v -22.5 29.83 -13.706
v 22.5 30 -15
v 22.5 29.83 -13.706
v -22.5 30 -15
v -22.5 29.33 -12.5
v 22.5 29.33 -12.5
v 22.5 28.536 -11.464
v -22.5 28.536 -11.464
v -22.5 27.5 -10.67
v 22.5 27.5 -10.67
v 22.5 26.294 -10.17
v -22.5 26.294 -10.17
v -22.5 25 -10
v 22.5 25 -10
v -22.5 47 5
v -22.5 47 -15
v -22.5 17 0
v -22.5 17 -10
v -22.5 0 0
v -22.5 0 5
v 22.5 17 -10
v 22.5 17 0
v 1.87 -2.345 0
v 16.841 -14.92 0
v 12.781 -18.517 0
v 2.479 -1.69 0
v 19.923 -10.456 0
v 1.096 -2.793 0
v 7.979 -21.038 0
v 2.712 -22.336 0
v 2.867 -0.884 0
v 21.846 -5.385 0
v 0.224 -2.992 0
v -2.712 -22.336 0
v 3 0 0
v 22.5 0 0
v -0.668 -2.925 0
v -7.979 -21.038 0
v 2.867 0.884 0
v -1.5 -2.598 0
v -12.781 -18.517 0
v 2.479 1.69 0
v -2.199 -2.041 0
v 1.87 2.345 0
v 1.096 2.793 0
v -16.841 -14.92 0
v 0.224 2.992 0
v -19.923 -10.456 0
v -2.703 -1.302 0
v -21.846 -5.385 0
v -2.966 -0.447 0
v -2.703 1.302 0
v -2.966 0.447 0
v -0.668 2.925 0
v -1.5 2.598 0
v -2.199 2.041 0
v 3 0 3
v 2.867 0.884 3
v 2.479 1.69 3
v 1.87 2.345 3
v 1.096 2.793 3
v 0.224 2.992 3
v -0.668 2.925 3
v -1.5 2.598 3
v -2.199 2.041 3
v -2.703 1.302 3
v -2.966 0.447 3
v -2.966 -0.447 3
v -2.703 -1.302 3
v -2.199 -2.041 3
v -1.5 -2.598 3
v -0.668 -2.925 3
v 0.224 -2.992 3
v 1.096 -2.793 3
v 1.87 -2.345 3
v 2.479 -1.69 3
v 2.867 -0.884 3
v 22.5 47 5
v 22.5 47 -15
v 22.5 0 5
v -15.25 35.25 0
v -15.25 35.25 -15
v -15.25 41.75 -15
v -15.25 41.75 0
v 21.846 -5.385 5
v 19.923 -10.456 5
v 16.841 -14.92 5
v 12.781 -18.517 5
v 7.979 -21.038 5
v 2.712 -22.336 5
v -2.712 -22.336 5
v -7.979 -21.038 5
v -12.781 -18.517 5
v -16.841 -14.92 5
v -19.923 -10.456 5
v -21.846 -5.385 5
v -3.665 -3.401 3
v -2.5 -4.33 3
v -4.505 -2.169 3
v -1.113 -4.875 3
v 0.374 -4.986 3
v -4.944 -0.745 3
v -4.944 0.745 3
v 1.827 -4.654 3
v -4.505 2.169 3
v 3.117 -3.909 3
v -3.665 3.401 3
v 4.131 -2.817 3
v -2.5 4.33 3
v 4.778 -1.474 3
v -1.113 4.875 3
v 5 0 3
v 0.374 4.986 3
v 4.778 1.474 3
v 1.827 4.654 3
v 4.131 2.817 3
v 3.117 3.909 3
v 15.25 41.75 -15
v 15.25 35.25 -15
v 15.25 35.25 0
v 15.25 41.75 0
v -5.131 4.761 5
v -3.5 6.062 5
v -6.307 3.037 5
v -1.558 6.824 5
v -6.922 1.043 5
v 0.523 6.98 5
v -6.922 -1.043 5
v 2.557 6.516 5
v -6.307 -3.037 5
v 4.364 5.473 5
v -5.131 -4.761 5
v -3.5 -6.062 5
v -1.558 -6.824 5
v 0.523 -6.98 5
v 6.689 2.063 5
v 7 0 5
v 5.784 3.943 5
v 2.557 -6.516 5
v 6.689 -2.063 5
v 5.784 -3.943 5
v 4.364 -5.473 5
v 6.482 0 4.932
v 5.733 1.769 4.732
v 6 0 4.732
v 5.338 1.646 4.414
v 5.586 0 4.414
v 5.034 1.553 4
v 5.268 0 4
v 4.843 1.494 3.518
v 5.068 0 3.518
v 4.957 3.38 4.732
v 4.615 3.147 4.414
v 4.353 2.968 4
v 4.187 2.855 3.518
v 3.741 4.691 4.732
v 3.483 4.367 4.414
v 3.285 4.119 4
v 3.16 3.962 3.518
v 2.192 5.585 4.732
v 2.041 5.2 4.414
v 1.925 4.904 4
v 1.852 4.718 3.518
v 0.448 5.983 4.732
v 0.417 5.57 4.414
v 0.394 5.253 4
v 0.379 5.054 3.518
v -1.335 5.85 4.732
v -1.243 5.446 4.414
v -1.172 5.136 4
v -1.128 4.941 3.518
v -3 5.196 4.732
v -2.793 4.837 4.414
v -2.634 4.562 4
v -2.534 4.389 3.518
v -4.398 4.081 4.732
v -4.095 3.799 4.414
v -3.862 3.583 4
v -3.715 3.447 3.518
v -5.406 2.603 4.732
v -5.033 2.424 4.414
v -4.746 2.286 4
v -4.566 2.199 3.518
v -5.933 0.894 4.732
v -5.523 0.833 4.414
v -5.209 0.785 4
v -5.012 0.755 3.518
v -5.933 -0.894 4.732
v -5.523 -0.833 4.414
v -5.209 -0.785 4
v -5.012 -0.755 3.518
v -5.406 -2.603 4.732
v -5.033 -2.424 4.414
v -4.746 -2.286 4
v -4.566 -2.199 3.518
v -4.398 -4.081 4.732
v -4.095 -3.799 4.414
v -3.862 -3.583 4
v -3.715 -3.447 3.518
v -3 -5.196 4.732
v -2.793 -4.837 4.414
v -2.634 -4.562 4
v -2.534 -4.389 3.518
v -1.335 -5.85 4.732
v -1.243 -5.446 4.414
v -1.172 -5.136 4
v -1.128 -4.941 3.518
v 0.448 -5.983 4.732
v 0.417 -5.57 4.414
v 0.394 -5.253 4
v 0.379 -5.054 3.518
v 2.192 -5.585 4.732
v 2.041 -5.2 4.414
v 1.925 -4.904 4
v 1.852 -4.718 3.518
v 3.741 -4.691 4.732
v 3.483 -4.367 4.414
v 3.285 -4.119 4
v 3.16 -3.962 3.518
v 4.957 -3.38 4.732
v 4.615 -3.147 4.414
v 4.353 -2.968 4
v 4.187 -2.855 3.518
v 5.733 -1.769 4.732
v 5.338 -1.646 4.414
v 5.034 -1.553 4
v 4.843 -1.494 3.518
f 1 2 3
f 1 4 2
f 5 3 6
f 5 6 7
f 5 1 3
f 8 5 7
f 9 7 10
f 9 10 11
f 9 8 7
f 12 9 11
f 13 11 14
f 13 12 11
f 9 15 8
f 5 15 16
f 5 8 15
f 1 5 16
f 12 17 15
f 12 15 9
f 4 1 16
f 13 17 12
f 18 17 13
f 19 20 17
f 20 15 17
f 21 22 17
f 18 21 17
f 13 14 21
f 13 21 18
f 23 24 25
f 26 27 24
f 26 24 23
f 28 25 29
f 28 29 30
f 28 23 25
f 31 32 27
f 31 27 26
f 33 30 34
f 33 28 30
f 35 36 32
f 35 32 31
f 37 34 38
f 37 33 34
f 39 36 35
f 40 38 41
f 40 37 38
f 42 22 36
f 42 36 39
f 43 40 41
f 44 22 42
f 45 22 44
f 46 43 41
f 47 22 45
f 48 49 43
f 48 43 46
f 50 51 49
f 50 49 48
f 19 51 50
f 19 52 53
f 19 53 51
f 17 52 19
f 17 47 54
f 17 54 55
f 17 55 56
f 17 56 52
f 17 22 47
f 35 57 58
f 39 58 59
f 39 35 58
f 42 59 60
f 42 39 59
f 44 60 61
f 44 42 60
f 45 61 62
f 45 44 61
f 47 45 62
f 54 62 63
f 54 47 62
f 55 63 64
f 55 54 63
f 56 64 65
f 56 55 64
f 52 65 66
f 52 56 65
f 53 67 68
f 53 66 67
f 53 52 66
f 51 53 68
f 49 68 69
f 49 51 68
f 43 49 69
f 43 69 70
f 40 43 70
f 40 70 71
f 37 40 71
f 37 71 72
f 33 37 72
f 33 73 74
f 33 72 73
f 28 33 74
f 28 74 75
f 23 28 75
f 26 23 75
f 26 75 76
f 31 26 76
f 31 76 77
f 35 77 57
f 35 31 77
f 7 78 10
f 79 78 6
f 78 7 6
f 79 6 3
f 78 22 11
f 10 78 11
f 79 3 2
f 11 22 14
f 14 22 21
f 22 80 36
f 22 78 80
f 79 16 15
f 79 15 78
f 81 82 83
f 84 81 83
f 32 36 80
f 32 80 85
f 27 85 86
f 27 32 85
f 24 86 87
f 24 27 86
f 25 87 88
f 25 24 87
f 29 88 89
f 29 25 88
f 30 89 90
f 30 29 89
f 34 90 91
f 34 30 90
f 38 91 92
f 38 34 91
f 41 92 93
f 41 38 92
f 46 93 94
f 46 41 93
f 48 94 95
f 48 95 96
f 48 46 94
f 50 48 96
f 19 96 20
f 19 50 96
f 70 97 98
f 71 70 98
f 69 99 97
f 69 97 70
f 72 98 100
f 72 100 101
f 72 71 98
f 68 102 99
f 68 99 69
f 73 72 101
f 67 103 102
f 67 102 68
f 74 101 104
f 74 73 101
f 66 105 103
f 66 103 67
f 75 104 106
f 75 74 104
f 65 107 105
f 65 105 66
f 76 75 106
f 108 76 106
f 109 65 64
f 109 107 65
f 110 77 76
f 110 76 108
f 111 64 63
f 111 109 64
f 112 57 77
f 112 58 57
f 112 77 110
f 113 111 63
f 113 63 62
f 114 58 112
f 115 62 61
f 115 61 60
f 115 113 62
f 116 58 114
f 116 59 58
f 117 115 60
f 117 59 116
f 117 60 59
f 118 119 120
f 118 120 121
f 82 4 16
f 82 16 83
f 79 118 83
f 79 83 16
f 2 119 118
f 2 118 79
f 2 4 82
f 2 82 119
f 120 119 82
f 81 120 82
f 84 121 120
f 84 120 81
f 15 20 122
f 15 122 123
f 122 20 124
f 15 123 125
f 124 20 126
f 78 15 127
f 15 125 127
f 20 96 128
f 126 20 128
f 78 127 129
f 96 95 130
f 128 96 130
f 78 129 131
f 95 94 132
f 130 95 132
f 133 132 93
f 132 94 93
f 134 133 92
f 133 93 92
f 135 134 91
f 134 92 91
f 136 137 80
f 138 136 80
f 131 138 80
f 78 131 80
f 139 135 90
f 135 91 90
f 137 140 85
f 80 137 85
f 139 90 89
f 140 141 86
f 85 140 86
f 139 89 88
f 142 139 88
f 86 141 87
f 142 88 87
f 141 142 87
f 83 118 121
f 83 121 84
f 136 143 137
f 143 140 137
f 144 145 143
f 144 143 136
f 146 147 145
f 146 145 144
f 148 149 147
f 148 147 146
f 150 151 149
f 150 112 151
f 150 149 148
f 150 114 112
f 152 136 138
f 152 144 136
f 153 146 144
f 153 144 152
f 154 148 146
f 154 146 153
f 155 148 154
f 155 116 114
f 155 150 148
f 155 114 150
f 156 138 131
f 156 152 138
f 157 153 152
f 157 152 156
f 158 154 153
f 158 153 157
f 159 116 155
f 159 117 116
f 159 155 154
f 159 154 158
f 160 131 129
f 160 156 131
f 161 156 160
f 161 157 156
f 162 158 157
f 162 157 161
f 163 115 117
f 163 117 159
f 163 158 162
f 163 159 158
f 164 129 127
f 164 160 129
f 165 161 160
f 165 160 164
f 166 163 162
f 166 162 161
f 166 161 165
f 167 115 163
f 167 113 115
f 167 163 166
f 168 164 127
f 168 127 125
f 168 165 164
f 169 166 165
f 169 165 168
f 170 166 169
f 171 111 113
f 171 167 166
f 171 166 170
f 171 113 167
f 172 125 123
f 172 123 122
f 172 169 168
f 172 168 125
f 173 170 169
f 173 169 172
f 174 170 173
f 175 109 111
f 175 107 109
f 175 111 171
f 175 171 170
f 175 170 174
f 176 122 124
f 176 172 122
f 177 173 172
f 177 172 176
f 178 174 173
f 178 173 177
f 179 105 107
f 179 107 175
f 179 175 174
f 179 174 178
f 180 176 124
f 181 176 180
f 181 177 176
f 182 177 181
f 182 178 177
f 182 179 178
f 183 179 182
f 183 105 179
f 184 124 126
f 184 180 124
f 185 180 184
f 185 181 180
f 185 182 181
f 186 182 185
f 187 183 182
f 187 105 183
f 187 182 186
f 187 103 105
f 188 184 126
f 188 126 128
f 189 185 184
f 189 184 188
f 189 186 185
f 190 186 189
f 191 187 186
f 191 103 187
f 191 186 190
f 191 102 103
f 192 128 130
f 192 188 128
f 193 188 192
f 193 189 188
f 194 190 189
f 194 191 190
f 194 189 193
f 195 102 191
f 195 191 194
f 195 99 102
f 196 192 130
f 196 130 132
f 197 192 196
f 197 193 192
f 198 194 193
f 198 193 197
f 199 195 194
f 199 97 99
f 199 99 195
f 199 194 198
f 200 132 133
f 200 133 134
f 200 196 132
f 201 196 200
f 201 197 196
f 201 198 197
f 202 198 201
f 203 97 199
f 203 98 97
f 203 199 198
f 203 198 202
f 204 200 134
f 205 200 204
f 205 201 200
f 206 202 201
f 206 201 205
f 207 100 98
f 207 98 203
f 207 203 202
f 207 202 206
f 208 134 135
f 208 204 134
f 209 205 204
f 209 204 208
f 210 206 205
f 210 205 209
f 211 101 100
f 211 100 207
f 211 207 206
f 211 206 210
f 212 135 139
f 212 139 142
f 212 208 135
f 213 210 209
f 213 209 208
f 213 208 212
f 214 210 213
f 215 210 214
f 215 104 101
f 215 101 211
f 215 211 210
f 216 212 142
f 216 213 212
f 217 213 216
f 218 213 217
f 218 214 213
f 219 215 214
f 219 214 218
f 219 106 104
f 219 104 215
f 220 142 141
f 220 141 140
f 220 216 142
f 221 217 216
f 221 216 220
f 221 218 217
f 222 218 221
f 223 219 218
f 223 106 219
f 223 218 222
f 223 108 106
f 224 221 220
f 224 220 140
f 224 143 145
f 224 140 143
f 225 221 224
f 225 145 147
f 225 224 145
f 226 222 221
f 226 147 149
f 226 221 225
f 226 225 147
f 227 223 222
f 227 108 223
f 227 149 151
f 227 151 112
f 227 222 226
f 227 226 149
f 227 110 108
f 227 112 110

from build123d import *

# Parameters (mm, degrees)
ESBO_O2_R                = 3
RESSALTO_EXTRUS_O1_DEPTH = 5
ESBO_O7_R                = 5
CORTE_EXTRUS_O2_DEPTH    = 2
ESBO_O3_W                = 45
ESBO_O3_H                = 13
RESSALTO_EXTRUS_O2_DEPTH = 10
ESBO_O4_W                = 45
ESBO_O4_H                = 20
RESSALTO_EXTRUS_O3_DEPTH = 17
ESBO_O6_W                = 30.5
ESBO_O6_H                = 6.5
CORTE_EXTRUS_O1_DEPTH    = 15
FILETE4_R                = 5
FILETE5_R                = 2


with BuildPart() as part:
    # Esboço2 → Ressalto-extrusão1 (new body)
    with BuildSketch(Plane.XY):
        with BuildLine():
            Line((-22.5, 0), (-22.5, 30))
            Line((-22.5, 30), (22.5, 30))
            Line((22.5, 30), (22.5, 0))
            ThreePointArc((22.5, 0), (0, -22.5), (-22.5, 0))
        make_face()
        Circle(ESBO_O2_R, mode=Mode.SUBTRACT)
    extrude(amount=RESSALTO_EXTRUS_O1_DEPTH)

    # Esboço7 → Corte-extrusão2 (cut)
    with BuildSketch(Plane.XY.offset(5)):
        Circle(ESBO_O7_R)
    extrude(amount=-CORTE_EXTRUS_O2_DEPTH, mode=Mode.SUBTRACT)

    # Esboço3 → Ressalto-extrusão2 (add)
    with BuildSketch(Plane(origin=(0, 0, 0), x_dir=(-1, 0, 0), z_dir=(0, 0, -1))):
        with Locations((0, 23.5)):
            Rectangle(ESBO_O3_W, ESBO_O3_H)
    extrude(amount=RESSALTO_EXTRUS_O2_DEPTH)

    # Esboço4 → Ressalto-extrusão3 (add)
    with BuildSketch(Plane(origin=(0, 30, 0), x_dir=(1, 0, 0), z_dir=(0, 1, 0))):
        with Locations((0, 5)):
            Rectangle(ESBO_O4_W, ESBO_O4_H)
    extrude(amount=RESSALTO_EXTRUS_O3_DEPTH)

    # Esboço6 → Corte-extrusão1 (cut)
    with BuildSketch(Plane(origin=(0, 0, -15), x_dir=(-1, 0, 0), z_dir=(0, 0, -1))):
        with Locations((0, 38.5)):
            Rectangle(ESBO_O6_W, ESBO_O6_H)
    extrude(amount=-CORTE_EXTRUS_O1_DEPTH, mode=Mode.SUBTRACT)

    # Filete4
    filete4_edges = [part.edges().sort_by_distance(p)[0] for p in [
        (0, 30, -10),
    ]]
    fillet(filete4_edges, radius=FILETE4_R - 0.0001)  # a hair under: the kernel refuses the full size

    # Filete5
    filete5_edges = [part.edges().sort_by_distance(p)[0] for p in [
        (-5, 0, 5),
    ]]
    fillet(filete5_edges, radius=FILETE5_R - 0.0001)  # a hair under: the kernel refuses the full size


solid = part.part
